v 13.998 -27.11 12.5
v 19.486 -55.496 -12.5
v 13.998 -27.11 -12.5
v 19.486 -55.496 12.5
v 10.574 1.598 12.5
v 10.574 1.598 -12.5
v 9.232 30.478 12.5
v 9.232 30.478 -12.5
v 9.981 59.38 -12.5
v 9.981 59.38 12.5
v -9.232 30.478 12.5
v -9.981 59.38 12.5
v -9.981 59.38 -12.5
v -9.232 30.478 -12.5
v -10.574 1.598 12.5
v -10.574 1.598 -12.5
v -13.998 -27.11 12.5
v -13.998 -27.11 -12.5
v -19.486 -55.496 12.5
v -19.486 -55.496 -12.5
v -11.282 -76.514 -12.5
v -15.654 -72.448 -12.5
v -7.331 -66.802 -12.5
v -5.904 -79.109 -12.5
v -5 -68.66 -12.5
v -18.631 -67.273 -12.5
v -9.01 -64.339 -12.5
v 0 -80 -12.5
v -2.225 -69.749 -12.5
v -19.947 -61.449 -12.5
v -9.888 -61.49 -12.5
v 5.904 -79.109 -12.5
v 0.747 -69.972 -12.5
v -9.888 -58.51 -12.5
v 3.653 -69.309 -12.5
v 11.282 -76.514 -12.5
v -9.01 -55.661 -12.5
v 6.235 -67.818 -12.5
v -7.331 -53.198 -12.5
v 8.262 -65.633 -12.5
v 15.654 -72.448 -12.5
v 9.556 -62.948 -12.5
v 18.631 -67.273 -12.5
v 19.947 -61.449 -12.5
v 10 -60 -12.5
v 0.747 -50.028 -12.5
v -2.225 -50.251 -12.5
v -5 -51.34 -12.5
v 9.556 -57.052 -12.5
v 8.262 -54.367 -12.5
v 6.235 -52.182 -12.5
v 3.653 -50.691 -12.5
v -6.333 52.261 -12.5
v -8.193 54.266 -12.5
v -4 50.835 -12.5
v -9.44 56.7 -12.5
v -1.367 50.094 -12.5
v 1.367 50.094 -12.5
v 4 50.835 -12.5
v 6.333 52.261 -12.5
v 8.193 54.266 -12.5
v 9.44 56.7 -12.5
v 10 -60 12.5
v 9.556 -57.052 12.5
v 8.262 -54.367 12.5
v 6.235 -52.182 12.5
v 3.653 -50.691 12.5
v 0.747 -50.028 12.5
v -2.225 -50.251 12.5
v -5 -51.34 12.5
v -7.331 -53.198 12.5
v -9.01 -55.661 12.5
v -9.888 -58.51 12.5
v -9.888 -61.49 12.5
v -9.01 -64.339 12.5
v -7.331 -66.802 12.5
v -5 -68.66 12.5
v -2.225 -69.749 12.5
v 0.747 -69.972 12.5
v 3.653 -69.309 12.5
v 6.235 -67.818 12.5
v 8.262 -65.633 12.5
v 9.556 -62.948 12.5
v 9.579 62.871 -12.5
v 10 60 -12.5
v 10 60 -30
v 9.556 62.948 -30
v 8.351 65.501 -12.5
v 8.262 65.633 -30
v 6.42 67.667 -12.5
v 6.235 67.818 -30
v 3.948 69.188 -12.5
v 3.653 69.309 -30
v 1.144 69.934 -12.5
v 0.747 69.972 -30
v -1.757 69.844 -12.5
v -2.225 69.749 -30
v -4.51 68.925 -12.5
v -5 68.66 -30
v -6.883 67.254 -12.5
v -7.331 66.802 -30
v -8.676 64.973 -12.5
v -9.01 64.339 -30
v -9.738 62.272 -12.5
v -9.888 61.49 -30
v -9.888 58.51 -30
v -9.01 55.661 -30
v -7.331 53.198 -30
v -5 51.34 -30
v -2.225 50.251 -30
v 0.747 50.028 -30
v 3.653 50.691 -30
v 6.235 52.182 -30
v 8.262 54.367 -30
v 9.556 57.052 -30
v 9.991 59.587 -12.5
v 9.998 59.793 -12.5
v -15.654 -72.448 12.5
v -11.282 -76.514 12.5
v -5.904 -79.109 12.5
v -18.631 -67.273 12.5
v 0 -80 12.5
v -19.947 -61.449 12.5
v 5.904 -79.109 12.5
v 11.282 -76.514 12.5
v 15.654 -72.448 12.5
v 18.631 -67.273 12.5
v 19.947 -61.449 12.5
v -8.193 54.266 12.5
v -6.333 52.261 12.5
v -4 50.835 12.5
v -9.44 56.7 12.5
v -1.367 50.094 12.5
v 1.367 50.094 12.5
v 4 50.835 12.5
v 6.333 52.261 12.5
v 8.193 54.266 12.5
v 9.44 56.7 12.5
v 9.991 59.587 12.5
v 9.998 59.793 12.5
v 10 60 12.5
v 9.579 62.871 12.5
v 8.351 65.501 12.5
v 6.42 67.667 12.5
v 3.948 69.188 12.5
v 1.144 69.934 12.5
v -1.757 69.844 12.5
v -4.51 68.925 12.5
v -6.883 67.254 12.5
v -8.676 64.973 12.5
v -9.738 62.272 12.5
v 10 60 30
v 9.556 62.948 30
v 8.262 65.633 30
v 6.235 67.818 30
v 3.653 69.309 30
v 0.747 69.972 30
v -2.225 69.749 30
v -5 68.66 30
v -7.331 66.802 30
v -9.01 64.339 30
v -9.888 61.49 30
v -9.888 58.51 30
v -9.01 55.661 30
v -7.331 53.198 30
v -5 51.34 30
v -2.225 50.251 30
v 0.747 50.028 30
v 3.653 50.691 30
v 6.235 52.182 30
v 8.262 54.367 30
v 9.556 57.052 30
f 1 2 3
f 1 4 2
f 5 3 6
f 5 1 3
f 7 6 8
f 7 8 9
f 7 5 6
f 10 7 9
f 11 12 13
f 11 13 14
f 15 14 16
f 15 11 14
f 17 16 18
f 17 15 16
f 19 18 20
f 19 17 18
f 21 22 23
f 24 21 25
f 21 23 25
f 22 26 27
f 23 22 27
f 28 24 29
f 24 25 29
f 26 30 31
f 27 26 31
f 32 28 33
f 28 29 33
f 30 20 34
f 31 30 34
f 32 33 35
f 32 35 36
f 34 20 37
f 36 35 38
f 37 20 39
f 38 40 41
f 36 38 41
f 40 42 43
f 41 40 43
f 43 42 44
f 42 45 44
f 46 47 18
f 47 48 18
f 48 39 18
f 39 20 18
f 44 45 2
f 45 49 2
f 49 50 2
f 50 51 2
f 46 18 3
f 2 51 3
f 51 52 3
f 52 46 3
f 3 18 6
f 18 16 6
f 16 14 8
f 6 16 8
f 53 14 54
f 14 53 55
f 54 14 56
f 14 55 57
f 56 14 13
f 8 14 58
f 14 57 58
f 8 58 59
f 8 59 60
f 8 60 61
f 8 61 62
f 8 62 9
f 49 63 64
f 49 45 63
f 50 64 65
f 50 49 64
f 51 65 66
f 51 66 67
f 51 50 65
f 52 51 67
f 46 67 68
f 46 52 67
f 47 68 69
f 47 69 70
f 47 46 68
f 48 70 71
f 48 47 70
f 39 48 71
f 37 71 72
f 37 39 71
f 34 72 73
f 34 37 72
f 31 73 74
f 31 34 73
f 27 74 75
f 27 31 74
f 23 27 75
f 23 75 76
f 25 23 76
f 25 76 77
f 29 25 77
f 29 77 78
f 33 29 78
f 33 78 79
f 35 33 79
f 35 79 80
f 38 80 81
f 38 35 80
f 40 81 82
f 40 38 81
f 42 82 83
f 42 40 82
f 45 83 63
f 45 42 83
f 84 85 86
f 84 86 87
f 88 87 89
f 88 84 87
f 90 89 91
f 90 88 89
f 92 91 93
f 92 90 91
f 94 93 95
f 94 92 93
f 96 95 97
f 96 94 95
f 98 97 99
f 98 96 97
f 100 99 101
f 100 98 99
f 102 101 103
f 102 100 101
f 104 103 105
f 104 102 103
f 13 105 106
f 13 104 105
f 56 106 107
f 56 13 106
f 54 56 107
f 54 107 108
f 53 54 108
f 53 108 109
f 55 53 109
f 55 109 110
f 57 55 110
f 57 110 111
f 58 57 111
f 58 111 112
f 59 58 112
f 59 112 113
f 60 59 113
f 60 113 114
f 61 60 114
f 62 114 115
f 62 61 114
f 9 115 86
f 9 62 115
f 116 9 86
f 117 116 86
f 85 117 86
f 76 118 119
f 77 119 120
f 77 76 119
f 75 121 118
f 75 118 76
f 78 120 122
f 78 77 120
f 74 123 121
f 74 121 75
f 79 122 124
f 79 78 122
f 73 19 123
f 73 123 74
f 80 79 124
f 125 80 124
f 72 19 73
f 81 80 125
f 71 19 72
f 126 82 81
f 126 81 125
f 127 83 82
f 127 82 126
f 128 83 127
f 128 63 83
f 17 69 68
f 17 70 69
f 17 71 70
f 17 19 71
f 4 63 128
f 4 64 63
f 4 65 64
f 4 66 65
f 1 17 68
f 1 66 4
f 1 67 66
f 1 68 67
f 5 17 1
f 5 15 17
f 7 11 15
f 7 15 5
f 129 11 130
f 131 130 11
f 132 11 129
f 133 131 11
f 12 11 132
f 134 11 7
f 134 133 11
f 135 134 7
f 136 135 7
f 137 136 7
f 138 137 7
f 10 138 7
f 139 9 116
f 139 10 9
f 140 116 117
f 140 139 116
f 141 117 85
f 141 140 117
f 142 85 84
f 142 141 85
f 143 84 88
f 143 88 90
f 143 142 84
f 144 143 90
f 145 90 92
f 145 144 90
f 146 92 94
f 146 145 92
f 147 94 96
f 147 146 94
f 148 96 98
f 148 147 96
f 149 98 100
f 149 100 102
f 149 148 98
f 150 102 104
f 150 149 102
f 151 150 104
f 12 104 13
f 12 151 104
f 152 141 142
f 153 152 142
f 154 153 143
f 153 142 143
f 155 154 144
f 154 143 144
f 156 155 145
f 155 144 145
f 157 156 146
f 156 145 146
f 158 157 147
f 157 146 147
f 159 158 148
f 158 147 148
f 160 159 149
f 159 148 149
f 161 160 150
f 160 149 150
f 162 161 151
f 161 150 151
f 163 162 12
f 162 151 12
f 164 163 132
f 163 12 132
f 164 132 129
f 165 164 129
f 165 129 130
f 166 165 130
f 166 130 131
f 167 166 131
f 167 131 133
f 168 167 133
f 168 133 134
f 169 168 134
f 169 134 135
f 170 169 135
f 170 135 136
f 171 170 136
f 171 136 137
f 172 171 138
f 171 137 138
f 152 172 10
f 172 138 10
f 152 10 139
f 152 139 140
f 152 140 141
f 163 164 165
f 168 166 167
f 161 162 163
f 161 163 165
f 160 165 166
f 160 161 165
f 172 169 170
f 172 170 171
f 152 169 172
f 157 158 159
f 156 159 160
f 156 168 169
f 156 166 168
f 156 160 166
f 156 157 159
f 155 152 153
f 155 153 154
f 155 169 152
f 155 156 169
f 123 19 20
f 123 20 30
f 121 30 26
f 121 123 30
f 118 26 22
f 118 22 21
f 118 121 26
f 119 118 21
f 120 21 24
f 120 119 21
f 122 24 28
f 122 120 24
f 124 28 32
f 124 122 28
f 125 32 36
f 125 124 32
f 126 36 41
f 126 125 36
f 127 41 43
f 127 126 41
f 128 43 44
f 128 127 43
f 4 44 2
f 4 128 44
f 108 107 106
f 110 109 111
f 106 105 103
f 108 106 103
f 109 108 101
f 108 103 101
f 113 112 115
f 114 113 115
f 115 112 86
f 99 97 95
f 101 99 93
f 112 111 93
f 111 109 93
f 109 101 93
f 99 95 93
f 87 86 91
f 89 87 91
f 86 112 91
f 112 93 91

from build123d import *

# Parameters (mm, degrees)
BOSS_EXTRUDE1_DEPTH      = 12.5
BOSS_EXTRUDE1_DEPTH_BACK = 12.5
SKETCH1_R                = 10
SKETCH2_R                = 10
BOSS_EXTRUDE2_DEPTH      = 17.5


with BuildPart() as part:
    # Sketch1 → Boss-Extrude1 (new, two sides: drawn at the far end of the back side and taken through both)
    with BuildSketch(Plane.XY.offset(-BOSS_EXTRUDE1_DEPTH_BACK)):
        with BuildLine():
            ThreePointArc((9.980766544, 59.380081301), (0, 70), (-9.980766544, 59.380081301))
            ThreePointArc((-9.980766544, 59.380081301), (-10.573802909, 1.597827145), (-19.486258491, -55.496031746))
            ThreePointArc((-19.486258491, -55.496031746), (0, -80), (19.486258491, -55.496031746))
            ThreePointArc((19.486258491, -55.496031746), (10.573802909, 1.597827145), (9.980766544, 59.380081301))
        make_face()
        with Locations((0, -60)):
            Circle(SKETCH1_R, mode=Mode.SUBTRACT)
    extrude(amount=BOSS_EXTRUDE1_DEPTH + BOSS_EXTRUDE1_DEPTH_BACK)

    # Sketch2 → Boss-Extrude2 (add)
    with BuildSketch(Plane.XY.offset(12.5)):
        with Locations((0, 60)):
            Circle(SKETCH2_R)
    boss_extrude2 = extrude(amount=BOSS_EXTRUDE2_DEPTH)

    # Mirror1: Boss-Extrude2 across plane
    add(boss_extrude2.mirror(Plane.XY))


solid = part.part
